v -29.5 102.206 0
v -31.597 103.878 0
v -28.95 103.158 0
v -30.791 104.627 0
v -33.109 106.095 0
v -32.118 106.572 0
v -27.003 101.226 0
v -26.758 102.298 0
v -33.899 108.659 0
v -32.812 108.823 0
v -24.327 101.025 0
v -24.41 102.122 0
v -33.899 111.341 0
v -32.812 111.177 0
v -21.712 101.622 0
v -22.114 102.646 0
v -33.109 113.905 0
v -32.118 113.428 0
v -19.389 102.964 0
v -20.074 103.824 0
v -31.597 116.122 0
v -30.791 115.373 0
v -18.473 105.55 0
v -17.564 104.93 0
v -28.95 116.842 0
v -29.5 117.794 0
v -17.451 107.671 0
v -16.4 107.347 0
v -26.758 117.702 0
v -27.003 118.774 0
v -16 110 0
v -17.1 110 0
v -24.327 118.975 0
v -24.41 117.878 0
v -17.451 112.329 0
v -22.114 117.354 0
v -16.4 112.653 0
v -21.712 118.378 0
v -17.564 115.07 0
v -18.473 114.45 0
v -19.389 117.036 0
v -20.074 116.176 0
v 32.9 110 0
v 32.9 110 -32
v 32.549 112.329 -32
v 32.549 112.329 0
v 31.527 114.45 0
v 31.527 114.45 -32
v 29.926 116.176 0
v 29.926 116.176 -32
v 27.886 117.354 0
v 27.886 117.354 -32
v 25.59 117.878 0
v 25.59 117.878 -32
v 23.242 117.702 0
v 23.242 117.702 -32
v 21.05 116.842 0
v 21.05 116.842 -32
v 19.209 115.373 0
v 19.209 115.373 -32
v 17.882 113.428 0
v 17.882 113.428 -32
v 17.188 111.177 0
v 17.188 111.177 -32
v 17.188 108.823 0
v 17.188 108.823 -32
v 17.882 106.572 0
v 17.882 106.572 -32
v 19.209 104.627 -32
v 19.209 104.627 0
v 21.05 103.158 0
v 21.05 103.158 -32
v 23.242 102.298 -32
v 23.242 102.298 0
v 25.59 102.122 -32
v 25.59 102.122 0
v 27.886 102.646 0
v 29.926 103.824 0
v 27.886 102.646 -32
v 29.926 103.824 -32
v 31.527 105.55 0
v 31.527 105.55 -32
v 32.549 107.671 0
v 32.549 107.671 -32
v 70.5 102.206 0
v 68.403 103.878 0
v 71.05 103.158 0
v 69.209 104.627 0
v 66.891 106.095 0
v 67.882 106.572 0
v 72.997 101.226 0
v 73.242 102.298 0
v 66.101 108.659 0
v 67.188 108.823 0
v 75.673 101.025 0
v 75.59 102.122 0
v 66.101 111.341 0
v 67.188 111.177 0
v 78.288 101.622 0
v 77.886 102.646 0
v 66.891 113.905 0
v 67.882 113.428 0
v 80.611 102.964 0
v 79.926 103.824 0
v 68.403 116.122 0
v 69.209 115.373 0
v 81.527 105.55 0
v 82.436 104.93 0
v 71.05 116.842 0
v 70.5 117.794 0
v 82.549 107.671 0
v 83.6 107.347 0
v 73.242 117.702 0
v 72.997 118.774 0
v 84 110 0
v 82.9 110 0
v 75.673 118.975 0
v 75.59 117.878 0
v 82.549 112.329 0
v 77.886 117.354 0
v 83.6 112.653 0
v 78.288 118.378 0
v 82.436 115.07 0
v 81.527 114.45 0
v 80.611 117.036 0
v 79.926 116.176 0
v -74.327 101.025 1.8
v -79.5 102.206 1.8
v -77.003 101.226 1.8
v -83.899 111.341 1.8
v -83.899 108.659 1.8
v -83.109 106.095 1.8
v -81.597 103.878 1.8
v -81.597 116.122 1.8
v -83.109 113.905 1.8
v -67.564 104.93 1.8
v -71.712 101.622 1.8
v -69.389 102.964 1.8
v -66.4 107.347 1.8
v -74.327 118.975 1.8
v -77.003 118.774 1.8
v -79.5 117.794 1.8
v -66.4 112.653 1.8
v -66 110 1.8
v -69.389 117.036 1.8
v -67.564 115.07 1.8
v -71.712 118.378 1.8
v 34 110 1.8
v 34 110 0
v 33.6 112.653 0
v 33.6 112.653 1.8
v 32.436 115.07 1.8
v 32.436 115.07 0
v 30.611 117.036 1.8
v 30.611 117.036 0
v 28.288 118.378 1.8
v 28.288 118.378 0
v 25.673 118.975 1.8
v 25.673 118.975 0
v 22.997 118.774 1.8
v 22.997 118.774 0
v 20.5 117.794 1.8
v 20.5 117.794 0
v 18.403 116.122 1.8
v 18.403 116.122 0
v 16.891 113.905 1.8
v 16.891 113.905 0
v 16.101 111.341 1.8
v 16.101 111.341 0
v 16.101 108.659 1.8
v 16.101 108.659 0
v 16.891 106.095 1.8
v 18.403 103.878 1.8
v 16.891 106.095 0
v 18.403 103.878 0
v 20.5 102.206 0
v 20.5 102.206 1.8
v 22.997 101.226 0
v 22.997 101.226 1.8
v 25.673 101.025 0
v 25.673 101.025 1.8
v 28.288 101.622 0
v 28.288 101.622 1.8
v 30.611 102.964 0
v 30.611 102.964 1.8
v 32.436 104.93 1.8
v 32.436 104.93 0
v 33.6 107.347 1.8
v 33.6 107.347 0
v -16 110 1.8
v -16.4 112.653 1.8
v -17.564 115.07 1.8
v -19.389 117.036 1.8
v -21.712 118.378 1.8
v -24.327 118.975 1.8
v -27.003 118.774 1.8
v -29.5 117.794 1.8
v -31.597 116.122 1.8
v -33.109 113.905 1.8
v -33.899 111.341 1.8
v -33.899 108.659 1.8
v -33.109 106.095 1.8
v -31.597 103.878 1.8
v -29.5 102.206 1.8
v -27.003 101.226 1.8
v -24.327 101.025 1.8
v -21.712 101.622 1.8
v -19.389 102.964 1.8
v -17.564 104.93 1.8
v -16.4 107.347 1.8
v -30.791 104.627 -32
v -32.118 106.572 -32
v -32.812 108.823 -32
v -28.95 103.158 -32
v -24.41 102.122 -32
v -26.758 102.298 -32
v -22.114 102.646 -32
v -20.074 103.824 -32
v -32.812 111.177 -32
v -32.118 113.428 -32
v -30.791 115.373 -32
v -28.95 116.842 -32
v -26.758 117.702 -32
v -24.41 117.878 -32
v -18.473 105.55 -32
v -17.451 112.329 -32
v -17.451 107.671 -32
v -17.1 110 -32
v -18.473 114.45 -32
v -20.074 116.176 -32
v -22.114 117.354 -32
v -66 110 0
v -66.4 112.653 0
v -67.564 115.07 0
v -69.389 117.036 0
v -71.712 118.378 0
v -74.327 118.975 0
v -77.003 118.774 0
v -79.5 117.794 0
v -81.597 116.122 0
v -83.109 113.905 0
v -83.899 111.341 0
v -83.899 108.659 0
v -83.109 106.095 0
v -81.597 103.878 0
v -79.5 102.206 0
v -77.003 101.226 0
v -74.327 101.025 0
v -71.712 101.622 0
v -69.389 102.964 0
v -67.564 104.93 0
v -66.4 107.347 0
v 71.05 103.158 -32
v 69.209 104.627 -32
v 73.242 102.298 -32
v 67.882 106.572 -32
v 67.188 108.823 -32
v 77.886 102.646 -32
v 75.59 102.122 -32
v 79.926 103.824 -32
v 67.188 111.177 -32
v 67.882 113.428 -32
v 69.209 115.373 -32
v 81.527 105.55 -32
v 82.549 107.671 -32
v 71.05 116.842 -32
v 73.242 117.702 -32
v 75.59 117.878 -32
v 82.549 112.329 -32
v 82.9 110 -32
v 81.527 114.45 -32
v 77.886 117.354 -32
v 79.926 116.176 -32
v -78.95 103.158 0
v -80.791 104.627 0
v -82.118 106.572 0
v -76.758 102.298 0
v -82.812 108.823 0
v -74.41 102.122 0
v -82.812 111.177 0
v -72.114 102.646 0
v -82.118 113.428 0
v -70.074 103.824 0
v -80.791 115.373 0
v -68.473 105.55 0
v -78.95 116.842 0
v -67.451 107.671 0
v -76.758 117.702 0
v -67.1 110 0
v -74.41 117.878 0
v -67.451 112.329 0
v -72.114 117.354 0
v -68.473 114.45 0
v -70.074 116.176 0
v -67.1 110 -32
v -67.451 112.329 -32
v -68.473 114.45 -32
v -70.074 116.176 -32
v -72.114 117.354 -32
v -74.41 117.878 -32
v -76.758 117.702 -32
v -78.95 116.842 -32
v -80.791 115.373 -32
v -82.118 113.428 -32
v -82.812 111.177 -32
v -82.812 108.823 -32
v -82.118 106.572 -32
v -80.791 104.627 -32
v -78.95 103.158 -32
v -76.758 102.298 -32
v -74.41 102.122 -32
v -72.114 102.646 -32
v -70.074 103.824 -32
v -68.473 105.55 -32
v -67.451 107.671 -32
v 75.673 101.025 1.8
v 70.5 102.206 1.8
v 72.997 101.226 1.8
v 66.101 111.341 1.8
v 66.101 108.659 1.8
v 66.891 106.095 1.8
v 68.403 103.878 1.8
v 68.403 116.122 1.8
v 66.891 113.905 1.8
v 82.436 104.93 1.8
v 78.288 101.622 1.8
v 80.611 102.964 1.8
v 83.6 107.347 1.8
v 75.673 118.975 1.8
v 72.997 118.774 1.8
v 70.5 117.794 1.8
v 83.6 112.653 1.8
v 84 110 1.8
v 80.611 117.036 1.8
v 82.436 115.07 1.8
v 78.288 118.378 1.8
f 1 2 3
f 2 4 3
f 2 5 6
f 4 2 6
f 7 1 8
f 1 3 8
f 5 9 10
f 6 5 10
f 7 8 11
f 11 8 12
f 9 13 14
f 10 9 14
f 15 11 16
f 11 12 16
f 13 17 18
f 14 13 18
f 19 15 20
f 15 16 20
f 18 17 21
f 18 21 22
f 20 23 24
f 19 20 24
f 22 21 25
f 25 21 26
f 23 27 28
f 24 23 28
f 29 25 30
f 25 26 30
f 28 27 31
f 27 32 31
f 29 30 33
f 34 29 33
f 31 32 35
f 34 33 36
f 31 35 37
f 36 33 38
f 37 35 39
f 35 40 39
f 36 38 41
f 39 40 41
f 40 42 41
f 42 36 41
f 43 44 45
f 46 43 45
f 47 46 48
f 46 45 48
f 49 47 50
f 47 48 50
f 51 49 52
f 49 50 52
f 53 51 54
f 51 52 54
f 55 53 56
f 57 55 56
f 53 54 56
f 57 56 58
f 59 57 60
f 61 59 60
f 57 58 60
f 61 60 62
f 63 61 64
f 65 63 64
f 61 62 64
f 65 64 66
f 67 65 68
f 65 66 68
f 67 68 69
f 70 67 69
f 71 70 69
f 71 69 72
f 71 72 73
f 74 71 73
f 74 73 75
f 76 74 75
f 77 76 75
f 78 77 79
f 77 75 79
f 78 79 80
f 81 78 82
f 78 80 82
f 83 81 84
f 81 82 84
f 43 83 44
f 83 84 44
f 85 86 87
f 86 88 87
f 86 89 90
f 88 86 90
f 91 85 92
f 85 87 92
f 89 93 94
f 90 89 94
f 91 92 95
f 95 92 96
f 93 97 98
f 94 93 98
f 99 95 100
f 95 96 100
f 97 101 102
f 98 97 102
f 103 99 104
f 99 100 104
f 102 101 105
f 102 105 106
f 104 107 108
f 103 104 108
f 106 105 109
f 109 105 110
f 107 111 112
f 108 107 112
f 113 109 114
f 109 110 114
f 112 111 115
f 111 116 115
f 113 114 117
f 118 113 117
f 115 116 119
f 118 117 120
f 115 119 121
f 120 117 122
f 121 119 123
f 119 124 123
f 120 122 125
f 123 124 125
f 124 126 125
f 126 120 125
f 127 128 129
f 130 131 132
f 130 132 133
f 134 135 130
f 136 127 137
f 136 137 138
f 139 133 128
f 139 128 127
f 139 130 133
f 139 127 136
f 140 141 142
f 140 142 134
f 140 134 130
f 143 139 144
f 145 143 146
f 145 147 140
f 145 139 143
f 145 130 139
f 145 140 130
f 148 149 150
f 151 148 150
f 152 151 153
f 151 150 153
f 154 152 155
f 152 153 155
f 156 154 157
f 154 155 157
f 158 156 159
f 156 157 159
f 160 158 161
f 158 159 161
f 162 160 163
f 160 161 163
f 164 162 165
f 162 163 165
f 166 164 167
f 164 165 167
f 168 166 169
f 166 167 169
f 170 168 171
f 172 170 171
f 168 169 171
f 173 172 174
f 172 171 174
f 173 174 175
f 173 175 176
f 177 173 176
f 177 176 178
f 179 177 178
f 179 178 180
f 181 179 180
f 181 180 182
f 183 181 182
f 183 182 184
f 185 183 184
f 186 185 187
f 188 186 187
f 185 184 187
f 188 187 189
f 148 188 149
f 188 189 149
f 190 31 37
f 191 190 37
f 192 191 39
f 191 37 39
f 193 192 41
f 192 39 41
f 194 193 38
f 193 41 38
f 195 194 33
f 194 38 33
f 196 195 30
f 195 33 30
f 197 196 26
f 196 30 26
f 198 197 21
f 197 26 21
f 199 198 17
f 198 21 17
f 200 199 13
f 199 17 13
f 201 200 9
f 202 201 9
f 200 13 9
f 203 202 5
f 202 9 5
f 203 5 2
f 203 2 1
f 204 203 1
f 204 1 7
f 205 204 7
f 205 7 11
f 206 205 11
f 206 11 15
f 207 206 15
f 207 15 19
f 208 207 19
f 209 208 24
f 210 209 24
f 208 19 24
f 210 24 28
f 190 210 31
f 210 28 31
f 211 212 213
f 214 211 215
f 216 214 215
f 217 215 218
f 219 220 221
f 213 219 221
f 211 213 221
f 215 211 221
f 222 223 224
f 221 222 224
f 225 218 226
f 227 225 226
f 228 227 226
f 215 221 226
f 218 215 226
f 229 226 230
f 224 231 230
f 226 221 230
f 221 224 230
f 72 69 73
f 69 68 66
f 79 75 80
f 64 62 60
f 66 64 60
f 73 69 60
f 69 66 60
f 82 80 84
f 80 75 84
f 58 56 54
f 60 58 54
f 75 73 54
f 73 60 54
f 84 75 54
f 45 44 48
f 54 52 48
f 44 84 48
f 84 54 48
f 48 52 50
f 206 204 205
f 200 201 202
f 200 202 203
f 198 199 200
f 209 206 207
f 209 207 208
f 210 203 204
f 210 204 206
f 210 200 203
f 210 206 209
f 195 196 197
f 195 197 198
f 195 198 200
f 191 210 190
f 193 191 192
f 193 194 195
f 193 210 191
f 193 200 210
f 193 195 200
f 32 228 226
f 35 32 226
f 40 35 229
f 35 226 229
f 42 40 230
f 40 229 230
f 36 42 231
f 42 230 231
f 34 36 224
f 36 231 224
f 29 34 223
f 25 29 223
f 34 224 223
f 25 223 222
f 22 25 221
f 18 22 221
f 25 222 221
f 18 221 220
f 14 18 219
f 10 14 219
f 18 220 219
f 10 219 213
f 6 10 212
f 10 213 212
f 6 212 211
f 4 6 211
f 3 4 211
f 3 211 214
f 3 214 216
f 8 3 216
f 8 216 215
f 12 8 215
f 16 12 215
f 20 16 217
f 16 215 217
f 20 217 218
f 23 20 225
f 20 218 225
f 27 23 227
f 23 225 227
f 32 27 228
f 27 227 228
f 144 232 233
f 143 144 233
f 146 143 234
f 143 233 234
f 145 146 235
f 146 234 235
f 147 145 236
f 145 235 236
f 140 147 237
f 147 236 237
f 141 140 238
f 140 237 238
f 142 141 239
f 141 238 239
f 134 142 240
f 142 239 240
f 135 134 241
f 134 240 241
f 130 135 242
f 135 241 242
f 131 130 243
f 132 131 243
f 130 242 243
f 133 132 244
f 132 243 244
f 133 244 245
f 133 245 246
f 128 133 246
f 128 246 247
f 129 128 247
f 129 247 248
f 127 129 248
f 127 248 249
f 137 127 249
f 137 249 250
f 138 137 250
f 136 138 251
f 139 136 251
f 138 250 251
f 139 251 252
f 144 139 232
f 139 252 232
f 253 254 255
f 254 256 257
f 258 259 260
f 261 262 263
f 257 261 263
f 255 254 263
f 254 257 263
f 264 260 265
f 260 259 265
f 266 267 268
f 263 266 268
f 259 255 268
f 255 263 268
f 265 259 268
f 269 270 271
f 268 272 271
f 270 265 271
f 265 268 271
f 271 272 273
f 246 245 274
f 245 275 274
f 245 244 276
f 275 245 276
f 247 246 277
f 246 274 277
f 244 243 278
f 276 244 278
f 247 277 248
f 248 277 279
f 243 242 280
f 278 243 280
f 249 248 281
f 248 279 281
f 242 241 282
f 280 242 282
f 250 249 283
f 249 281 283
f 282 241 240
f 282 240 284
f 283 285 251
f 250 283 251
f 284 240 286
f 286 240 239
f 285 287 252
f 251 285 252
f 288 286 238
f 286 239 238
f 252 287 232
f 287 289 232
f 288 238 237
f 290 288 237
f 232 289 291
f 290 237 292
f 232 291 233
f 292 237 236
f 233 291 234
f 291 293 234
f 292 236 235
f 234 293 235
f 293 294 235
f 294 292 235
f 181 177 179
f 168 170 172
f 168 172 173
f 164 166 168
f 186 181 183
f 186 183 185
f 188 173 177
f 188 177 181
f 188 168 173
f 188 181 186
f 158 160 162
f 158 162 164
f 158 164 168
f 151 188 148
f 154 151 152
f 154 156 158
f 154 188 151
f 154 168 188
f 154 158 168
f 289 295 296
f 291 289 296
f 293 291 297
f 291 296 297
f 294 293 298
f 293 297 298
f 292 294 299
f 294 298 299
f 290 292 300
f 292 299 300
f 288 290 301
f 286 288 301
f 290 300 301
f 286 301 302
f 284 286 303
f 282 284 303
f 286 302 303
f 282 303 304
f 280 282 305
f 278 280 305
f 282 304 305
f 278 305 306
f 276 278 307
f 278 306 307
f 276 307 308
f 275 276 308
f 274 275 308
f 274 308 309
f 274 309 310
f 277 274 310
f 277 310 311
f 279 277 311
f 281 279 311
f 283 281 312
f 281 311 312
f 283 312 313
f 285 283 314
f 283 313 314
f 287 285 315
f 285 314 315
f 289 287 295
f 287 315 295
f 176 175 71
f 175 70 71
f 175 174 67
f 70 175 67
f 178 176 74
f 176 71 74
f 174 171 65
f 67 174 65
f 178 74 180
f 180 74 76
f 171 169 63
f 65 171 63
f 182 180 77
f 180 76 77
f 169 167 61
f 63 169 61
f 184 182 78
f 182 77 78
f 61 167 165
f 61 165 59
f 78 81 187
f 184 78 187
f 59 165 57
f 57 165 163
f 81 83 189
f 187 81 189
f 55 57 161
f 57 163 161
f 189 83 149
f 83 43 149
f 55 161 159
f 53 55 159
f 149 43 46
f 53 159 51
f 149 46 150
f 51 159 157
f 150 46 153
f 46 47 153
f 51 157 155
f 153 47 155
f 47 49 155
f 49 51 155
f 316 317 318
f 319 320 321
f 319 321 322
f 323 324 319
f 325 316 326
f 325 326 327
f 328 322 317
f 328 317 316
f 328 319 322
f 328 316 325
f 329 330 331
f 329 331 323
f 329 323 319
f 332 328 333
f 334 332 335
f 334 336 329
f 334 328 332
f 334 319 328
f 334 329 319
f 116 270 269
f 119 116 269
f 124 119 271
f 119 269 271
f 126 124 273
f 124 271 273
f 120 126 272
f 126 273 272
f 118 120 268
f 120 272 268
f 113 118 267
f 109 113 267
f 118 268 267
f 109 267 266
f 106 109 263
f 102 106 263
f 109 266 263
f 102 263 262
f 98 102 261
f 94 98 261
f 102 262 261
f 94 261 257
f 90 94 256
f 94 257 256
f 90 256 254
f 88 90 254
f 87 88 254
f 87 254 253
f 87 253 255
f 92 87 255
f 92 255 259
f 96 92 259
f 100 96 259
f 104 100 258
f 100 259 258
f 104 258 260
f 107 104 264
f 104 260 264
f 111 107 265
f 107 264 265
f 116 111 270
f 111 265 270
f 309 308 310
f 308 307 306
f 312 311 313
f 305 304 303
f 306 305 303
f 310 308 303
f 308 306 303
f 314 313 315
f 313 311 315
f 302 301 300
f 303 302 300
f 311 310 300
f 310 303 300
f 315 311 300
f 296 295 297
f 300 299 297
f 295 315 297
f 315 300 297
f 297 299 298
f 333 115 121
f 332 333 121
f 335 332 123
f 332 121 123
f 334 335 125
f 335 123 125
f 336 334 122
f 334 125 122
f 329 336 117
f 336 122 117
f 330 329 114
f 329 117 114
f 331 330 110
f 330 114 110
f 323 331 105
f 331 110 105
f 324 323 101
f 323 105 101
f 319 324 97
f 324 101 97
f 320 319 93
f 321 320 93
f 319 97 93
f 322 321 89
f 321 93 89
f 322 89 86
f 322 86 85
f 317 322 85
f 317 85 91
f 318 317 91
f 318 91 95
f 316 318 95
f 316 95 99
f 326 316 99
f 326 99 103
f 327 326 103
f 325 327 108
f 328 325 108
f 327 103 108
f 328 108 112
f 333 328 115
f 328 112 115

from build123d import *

# Parameters (mm, degrees)
V09_16MM_SWITCH_BODIES_TAIL_ALLOWANCE32_START = -32
SKETCH_3_R                                    = 7.9
V09_16MM_SWITCH_BODIES_TAIL_ALLOWANCE32_DEPTH = 32
V09_16MM_SWITCH_BODIES_TAIL_ALLOWANC_START    = -32
V09_16MM_SWITCH_BODIES_TAIL_ALLOWANC_2_DEPTH  = 32
V09_16MM_SWITCH_BODIES_TAIL_ALLOWANC_3_DEPTH  = 32
V09_16MM_SWITCH_BODIES_TAIL_ALLOWANC_4_DEPTH  = 32
SKETCH_4_R                                    = 9
V09_SWITCH_FLANGE_D18_DEPTH                   = 1.8


with BuildPart() as part:
    # 草图3 → V09_16mm_switch_bodies_tail_allowance32 (new body)
    with BuildSketch(Plane.XY.offset(V09_16MM_SWITCH_BODIES_TAIL_ALLOWANCE32_START)):
        with Locations((-75, 110)):
            Circle(SKETCH_3_R)
    extrude(amount=V09_16MM_SWITCH_BODIES_TAIL_ALLOWANCE32_DEPTH)



with BuildPart() as body_2:
    # 草图3 → V09_16mm_switch_bodies_tail_allowanc 2 (new body)
    with BuildSketch(Plane.XY.offset(V09_16MM_SWITCH_BODIES_TAIL_ALLOWANC_START)):
        with Locations((-25, 110)):
            Circle(SKETCH_3_R)
    extrude(amount=V09_16MM_SWITCH_BODIES_TAIL_ALLOWANC_2_DEPTH)


with BuildPart() as body_3:
    # 草图3 → V09_16mm_switch_bodies_tail_allowanc 3 (new body)
    with BuildSketch(Plane.XY.offset(V09_16MM_SWITCH_BODIES_TAIL_ALLOWANC_START)):
        with Locations((25, 110)):
            Circle(SKETCH_3_R)
    extrude(amount=V09_16MM_SWITCH_BODIES_TAIL_ALLOWANC_3_DEPTH)


with BuildPart() as body_4:
    # 草图3 → V09_16mm_switch_bodies_tail_allowanc 4 (new body)
    with BuildSketch(Plane.XY.offset(V09_16MM_SWITCH_BODIES_TAIL_ALLOWANC_START)):
        with Locations((75, 110)):
            Circle(SKETCH_3_R)
    extrude(amount=V09_16MM_SWITCH_BODIES_TAIL_ALLOWANC_4_DEPTH)


with BuildPart() as part_1:
    add(part.part)

    add(body_2.part)  # V09_Switch_flange_D18 merges body 2

    add(body_3.part)  # V09_Switch_flange_D18 merges body 3

    add(body_4.part)  # V09_Switch_flange_D18 merges body 4
    # 草图4 → V09_Switch_flange_D18 (add)
    with BuildSketch(Plane.XY):
        with Locations((-75, 110)):
            Circle(SKETCH_4_R)
        with Locations((-25, 110)):
            Circle(SKETCH_4_R)
        with Locations((25, 110)):
            Circle(SKETCH_4_R)
        with Locations((75, 110)):
            Circle(SKETCH_4_R)
    extrude(amount=V09_SWITCH_FLANGE_D18_DEPTH)


solid = part_1.part
